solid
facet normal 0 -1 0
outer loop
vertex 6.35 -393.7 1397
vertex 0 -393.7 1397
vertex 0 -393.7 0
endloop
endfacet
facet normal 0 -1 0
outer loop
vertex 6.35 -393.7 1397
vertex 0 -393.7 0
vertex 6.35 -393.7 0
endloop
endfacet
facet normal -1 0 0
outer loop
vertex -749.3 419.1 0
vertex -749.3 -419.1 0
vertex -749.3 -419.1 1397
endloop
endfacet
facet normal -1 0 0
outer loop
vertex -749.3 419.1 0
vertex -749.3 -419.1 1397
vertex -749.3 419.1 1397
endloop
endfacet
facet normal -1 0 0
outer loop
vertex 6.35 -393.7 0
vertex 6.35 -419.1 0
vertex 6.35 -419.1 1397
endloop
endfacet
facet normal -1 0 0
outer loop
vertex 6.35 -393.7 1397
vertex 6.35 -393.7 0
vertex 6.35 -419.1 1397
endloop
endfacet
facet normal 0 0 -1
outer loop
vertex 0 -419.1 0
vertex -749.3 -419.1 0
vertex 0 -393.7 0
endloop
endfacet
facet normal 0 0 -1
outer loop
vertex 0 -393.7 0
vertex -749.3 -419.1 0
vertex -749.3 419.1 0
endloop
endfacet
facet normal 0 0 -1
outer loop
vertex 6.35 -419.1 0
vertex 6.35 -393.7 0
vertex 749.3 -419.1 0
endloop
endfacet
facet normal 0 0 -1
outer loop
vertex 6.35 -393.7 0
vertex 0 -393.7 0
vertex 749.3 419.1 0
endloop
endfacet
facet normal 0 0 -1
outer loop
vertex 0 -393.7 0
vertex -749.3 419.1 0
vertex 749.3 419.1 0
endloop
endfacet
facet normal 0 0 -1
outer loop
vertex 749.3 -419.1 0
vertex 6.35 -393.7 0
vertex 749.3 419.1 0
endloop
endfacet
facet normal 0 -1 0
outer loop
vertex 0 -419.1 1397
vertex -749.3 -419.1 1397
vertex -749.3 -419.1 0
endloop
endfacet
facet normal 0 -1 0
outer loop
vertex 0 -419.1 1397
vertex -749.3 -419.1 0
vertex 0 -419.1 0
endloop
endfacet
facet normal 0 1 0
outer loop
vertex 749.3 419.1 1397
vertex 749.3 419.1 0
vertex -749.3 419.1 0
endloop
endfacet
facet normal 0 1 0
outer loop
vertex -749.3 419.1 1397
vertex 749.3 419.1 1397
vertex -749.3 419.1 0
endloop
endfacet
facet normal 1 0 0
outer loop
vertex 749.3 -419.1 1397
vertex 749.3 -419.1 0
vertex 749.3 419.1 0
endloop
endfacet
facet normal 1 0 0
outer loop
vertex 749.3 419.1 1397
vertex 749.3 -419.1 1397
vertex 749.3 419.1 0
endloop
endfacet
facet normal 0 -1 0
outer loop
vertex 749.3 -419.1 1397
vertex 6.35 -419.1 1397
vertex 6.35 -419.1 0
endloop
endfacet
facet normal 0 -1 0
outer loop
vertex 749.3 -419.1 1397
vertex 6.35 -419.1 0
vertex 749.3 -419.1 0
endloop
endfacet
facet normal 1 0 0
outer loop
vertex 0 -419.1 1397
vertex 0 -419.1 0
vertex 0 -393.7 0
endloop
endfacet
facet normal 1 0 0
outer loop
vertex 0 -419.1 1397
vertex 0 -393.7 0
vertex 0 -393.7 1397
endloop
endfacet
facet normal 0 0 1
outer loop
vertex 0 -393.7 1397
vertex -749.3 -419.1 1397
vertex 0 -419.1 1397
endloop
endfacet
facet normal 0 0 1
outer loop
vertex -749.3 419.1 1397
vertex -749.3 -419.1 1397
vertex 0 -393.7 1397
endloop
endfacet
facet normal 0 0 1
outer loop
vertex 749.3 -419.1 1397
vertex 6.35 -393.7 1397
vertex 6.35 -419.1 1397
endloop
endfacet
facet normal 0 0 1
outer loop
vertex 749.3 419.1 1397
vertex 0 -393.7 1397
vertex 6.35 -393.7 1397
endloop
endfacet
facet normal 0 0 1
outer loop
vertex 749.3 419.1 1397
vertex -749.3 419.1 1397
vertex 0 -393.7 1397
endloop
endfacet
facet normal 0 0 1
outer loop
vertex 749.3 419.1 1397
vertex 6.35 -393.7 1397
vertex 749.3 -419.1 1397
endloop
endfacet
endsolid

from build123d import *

# Parameters (mm, degrees)
F0_W     = 746.76
F0_H     = 838.2
F0_W_2   = 5.08
F1_DEPTH = 1397
F2_W     = 6.35
F2_H     = 1397
F3_DEPTH = 25.4


with BuildPart() as f1:
    # F0 (on Top) → F1 (new body)
    with BuildSketch(Plane.XY):
        with Locations((375.92, 0)):
            Rectangle(F0_W, F0_H)
        with Locations((-375.92, 0)):
            Rectangle(F0_W, F0_H)
        Rectangle(F0_W_2, F0_H)
    extrude(amount=F1_DEPTH)

    # F2 (on face) → F3 (cut)
    with BuildSketch(Plane.XZ.offset(419.1)):
        with Locations((3.175, 698.5)):
            Rectangle(F2_W, F2_H)
    extrude(amount=-F3_DEPTH, mode=Mode.SUBTRACT)


solid = f1.part
